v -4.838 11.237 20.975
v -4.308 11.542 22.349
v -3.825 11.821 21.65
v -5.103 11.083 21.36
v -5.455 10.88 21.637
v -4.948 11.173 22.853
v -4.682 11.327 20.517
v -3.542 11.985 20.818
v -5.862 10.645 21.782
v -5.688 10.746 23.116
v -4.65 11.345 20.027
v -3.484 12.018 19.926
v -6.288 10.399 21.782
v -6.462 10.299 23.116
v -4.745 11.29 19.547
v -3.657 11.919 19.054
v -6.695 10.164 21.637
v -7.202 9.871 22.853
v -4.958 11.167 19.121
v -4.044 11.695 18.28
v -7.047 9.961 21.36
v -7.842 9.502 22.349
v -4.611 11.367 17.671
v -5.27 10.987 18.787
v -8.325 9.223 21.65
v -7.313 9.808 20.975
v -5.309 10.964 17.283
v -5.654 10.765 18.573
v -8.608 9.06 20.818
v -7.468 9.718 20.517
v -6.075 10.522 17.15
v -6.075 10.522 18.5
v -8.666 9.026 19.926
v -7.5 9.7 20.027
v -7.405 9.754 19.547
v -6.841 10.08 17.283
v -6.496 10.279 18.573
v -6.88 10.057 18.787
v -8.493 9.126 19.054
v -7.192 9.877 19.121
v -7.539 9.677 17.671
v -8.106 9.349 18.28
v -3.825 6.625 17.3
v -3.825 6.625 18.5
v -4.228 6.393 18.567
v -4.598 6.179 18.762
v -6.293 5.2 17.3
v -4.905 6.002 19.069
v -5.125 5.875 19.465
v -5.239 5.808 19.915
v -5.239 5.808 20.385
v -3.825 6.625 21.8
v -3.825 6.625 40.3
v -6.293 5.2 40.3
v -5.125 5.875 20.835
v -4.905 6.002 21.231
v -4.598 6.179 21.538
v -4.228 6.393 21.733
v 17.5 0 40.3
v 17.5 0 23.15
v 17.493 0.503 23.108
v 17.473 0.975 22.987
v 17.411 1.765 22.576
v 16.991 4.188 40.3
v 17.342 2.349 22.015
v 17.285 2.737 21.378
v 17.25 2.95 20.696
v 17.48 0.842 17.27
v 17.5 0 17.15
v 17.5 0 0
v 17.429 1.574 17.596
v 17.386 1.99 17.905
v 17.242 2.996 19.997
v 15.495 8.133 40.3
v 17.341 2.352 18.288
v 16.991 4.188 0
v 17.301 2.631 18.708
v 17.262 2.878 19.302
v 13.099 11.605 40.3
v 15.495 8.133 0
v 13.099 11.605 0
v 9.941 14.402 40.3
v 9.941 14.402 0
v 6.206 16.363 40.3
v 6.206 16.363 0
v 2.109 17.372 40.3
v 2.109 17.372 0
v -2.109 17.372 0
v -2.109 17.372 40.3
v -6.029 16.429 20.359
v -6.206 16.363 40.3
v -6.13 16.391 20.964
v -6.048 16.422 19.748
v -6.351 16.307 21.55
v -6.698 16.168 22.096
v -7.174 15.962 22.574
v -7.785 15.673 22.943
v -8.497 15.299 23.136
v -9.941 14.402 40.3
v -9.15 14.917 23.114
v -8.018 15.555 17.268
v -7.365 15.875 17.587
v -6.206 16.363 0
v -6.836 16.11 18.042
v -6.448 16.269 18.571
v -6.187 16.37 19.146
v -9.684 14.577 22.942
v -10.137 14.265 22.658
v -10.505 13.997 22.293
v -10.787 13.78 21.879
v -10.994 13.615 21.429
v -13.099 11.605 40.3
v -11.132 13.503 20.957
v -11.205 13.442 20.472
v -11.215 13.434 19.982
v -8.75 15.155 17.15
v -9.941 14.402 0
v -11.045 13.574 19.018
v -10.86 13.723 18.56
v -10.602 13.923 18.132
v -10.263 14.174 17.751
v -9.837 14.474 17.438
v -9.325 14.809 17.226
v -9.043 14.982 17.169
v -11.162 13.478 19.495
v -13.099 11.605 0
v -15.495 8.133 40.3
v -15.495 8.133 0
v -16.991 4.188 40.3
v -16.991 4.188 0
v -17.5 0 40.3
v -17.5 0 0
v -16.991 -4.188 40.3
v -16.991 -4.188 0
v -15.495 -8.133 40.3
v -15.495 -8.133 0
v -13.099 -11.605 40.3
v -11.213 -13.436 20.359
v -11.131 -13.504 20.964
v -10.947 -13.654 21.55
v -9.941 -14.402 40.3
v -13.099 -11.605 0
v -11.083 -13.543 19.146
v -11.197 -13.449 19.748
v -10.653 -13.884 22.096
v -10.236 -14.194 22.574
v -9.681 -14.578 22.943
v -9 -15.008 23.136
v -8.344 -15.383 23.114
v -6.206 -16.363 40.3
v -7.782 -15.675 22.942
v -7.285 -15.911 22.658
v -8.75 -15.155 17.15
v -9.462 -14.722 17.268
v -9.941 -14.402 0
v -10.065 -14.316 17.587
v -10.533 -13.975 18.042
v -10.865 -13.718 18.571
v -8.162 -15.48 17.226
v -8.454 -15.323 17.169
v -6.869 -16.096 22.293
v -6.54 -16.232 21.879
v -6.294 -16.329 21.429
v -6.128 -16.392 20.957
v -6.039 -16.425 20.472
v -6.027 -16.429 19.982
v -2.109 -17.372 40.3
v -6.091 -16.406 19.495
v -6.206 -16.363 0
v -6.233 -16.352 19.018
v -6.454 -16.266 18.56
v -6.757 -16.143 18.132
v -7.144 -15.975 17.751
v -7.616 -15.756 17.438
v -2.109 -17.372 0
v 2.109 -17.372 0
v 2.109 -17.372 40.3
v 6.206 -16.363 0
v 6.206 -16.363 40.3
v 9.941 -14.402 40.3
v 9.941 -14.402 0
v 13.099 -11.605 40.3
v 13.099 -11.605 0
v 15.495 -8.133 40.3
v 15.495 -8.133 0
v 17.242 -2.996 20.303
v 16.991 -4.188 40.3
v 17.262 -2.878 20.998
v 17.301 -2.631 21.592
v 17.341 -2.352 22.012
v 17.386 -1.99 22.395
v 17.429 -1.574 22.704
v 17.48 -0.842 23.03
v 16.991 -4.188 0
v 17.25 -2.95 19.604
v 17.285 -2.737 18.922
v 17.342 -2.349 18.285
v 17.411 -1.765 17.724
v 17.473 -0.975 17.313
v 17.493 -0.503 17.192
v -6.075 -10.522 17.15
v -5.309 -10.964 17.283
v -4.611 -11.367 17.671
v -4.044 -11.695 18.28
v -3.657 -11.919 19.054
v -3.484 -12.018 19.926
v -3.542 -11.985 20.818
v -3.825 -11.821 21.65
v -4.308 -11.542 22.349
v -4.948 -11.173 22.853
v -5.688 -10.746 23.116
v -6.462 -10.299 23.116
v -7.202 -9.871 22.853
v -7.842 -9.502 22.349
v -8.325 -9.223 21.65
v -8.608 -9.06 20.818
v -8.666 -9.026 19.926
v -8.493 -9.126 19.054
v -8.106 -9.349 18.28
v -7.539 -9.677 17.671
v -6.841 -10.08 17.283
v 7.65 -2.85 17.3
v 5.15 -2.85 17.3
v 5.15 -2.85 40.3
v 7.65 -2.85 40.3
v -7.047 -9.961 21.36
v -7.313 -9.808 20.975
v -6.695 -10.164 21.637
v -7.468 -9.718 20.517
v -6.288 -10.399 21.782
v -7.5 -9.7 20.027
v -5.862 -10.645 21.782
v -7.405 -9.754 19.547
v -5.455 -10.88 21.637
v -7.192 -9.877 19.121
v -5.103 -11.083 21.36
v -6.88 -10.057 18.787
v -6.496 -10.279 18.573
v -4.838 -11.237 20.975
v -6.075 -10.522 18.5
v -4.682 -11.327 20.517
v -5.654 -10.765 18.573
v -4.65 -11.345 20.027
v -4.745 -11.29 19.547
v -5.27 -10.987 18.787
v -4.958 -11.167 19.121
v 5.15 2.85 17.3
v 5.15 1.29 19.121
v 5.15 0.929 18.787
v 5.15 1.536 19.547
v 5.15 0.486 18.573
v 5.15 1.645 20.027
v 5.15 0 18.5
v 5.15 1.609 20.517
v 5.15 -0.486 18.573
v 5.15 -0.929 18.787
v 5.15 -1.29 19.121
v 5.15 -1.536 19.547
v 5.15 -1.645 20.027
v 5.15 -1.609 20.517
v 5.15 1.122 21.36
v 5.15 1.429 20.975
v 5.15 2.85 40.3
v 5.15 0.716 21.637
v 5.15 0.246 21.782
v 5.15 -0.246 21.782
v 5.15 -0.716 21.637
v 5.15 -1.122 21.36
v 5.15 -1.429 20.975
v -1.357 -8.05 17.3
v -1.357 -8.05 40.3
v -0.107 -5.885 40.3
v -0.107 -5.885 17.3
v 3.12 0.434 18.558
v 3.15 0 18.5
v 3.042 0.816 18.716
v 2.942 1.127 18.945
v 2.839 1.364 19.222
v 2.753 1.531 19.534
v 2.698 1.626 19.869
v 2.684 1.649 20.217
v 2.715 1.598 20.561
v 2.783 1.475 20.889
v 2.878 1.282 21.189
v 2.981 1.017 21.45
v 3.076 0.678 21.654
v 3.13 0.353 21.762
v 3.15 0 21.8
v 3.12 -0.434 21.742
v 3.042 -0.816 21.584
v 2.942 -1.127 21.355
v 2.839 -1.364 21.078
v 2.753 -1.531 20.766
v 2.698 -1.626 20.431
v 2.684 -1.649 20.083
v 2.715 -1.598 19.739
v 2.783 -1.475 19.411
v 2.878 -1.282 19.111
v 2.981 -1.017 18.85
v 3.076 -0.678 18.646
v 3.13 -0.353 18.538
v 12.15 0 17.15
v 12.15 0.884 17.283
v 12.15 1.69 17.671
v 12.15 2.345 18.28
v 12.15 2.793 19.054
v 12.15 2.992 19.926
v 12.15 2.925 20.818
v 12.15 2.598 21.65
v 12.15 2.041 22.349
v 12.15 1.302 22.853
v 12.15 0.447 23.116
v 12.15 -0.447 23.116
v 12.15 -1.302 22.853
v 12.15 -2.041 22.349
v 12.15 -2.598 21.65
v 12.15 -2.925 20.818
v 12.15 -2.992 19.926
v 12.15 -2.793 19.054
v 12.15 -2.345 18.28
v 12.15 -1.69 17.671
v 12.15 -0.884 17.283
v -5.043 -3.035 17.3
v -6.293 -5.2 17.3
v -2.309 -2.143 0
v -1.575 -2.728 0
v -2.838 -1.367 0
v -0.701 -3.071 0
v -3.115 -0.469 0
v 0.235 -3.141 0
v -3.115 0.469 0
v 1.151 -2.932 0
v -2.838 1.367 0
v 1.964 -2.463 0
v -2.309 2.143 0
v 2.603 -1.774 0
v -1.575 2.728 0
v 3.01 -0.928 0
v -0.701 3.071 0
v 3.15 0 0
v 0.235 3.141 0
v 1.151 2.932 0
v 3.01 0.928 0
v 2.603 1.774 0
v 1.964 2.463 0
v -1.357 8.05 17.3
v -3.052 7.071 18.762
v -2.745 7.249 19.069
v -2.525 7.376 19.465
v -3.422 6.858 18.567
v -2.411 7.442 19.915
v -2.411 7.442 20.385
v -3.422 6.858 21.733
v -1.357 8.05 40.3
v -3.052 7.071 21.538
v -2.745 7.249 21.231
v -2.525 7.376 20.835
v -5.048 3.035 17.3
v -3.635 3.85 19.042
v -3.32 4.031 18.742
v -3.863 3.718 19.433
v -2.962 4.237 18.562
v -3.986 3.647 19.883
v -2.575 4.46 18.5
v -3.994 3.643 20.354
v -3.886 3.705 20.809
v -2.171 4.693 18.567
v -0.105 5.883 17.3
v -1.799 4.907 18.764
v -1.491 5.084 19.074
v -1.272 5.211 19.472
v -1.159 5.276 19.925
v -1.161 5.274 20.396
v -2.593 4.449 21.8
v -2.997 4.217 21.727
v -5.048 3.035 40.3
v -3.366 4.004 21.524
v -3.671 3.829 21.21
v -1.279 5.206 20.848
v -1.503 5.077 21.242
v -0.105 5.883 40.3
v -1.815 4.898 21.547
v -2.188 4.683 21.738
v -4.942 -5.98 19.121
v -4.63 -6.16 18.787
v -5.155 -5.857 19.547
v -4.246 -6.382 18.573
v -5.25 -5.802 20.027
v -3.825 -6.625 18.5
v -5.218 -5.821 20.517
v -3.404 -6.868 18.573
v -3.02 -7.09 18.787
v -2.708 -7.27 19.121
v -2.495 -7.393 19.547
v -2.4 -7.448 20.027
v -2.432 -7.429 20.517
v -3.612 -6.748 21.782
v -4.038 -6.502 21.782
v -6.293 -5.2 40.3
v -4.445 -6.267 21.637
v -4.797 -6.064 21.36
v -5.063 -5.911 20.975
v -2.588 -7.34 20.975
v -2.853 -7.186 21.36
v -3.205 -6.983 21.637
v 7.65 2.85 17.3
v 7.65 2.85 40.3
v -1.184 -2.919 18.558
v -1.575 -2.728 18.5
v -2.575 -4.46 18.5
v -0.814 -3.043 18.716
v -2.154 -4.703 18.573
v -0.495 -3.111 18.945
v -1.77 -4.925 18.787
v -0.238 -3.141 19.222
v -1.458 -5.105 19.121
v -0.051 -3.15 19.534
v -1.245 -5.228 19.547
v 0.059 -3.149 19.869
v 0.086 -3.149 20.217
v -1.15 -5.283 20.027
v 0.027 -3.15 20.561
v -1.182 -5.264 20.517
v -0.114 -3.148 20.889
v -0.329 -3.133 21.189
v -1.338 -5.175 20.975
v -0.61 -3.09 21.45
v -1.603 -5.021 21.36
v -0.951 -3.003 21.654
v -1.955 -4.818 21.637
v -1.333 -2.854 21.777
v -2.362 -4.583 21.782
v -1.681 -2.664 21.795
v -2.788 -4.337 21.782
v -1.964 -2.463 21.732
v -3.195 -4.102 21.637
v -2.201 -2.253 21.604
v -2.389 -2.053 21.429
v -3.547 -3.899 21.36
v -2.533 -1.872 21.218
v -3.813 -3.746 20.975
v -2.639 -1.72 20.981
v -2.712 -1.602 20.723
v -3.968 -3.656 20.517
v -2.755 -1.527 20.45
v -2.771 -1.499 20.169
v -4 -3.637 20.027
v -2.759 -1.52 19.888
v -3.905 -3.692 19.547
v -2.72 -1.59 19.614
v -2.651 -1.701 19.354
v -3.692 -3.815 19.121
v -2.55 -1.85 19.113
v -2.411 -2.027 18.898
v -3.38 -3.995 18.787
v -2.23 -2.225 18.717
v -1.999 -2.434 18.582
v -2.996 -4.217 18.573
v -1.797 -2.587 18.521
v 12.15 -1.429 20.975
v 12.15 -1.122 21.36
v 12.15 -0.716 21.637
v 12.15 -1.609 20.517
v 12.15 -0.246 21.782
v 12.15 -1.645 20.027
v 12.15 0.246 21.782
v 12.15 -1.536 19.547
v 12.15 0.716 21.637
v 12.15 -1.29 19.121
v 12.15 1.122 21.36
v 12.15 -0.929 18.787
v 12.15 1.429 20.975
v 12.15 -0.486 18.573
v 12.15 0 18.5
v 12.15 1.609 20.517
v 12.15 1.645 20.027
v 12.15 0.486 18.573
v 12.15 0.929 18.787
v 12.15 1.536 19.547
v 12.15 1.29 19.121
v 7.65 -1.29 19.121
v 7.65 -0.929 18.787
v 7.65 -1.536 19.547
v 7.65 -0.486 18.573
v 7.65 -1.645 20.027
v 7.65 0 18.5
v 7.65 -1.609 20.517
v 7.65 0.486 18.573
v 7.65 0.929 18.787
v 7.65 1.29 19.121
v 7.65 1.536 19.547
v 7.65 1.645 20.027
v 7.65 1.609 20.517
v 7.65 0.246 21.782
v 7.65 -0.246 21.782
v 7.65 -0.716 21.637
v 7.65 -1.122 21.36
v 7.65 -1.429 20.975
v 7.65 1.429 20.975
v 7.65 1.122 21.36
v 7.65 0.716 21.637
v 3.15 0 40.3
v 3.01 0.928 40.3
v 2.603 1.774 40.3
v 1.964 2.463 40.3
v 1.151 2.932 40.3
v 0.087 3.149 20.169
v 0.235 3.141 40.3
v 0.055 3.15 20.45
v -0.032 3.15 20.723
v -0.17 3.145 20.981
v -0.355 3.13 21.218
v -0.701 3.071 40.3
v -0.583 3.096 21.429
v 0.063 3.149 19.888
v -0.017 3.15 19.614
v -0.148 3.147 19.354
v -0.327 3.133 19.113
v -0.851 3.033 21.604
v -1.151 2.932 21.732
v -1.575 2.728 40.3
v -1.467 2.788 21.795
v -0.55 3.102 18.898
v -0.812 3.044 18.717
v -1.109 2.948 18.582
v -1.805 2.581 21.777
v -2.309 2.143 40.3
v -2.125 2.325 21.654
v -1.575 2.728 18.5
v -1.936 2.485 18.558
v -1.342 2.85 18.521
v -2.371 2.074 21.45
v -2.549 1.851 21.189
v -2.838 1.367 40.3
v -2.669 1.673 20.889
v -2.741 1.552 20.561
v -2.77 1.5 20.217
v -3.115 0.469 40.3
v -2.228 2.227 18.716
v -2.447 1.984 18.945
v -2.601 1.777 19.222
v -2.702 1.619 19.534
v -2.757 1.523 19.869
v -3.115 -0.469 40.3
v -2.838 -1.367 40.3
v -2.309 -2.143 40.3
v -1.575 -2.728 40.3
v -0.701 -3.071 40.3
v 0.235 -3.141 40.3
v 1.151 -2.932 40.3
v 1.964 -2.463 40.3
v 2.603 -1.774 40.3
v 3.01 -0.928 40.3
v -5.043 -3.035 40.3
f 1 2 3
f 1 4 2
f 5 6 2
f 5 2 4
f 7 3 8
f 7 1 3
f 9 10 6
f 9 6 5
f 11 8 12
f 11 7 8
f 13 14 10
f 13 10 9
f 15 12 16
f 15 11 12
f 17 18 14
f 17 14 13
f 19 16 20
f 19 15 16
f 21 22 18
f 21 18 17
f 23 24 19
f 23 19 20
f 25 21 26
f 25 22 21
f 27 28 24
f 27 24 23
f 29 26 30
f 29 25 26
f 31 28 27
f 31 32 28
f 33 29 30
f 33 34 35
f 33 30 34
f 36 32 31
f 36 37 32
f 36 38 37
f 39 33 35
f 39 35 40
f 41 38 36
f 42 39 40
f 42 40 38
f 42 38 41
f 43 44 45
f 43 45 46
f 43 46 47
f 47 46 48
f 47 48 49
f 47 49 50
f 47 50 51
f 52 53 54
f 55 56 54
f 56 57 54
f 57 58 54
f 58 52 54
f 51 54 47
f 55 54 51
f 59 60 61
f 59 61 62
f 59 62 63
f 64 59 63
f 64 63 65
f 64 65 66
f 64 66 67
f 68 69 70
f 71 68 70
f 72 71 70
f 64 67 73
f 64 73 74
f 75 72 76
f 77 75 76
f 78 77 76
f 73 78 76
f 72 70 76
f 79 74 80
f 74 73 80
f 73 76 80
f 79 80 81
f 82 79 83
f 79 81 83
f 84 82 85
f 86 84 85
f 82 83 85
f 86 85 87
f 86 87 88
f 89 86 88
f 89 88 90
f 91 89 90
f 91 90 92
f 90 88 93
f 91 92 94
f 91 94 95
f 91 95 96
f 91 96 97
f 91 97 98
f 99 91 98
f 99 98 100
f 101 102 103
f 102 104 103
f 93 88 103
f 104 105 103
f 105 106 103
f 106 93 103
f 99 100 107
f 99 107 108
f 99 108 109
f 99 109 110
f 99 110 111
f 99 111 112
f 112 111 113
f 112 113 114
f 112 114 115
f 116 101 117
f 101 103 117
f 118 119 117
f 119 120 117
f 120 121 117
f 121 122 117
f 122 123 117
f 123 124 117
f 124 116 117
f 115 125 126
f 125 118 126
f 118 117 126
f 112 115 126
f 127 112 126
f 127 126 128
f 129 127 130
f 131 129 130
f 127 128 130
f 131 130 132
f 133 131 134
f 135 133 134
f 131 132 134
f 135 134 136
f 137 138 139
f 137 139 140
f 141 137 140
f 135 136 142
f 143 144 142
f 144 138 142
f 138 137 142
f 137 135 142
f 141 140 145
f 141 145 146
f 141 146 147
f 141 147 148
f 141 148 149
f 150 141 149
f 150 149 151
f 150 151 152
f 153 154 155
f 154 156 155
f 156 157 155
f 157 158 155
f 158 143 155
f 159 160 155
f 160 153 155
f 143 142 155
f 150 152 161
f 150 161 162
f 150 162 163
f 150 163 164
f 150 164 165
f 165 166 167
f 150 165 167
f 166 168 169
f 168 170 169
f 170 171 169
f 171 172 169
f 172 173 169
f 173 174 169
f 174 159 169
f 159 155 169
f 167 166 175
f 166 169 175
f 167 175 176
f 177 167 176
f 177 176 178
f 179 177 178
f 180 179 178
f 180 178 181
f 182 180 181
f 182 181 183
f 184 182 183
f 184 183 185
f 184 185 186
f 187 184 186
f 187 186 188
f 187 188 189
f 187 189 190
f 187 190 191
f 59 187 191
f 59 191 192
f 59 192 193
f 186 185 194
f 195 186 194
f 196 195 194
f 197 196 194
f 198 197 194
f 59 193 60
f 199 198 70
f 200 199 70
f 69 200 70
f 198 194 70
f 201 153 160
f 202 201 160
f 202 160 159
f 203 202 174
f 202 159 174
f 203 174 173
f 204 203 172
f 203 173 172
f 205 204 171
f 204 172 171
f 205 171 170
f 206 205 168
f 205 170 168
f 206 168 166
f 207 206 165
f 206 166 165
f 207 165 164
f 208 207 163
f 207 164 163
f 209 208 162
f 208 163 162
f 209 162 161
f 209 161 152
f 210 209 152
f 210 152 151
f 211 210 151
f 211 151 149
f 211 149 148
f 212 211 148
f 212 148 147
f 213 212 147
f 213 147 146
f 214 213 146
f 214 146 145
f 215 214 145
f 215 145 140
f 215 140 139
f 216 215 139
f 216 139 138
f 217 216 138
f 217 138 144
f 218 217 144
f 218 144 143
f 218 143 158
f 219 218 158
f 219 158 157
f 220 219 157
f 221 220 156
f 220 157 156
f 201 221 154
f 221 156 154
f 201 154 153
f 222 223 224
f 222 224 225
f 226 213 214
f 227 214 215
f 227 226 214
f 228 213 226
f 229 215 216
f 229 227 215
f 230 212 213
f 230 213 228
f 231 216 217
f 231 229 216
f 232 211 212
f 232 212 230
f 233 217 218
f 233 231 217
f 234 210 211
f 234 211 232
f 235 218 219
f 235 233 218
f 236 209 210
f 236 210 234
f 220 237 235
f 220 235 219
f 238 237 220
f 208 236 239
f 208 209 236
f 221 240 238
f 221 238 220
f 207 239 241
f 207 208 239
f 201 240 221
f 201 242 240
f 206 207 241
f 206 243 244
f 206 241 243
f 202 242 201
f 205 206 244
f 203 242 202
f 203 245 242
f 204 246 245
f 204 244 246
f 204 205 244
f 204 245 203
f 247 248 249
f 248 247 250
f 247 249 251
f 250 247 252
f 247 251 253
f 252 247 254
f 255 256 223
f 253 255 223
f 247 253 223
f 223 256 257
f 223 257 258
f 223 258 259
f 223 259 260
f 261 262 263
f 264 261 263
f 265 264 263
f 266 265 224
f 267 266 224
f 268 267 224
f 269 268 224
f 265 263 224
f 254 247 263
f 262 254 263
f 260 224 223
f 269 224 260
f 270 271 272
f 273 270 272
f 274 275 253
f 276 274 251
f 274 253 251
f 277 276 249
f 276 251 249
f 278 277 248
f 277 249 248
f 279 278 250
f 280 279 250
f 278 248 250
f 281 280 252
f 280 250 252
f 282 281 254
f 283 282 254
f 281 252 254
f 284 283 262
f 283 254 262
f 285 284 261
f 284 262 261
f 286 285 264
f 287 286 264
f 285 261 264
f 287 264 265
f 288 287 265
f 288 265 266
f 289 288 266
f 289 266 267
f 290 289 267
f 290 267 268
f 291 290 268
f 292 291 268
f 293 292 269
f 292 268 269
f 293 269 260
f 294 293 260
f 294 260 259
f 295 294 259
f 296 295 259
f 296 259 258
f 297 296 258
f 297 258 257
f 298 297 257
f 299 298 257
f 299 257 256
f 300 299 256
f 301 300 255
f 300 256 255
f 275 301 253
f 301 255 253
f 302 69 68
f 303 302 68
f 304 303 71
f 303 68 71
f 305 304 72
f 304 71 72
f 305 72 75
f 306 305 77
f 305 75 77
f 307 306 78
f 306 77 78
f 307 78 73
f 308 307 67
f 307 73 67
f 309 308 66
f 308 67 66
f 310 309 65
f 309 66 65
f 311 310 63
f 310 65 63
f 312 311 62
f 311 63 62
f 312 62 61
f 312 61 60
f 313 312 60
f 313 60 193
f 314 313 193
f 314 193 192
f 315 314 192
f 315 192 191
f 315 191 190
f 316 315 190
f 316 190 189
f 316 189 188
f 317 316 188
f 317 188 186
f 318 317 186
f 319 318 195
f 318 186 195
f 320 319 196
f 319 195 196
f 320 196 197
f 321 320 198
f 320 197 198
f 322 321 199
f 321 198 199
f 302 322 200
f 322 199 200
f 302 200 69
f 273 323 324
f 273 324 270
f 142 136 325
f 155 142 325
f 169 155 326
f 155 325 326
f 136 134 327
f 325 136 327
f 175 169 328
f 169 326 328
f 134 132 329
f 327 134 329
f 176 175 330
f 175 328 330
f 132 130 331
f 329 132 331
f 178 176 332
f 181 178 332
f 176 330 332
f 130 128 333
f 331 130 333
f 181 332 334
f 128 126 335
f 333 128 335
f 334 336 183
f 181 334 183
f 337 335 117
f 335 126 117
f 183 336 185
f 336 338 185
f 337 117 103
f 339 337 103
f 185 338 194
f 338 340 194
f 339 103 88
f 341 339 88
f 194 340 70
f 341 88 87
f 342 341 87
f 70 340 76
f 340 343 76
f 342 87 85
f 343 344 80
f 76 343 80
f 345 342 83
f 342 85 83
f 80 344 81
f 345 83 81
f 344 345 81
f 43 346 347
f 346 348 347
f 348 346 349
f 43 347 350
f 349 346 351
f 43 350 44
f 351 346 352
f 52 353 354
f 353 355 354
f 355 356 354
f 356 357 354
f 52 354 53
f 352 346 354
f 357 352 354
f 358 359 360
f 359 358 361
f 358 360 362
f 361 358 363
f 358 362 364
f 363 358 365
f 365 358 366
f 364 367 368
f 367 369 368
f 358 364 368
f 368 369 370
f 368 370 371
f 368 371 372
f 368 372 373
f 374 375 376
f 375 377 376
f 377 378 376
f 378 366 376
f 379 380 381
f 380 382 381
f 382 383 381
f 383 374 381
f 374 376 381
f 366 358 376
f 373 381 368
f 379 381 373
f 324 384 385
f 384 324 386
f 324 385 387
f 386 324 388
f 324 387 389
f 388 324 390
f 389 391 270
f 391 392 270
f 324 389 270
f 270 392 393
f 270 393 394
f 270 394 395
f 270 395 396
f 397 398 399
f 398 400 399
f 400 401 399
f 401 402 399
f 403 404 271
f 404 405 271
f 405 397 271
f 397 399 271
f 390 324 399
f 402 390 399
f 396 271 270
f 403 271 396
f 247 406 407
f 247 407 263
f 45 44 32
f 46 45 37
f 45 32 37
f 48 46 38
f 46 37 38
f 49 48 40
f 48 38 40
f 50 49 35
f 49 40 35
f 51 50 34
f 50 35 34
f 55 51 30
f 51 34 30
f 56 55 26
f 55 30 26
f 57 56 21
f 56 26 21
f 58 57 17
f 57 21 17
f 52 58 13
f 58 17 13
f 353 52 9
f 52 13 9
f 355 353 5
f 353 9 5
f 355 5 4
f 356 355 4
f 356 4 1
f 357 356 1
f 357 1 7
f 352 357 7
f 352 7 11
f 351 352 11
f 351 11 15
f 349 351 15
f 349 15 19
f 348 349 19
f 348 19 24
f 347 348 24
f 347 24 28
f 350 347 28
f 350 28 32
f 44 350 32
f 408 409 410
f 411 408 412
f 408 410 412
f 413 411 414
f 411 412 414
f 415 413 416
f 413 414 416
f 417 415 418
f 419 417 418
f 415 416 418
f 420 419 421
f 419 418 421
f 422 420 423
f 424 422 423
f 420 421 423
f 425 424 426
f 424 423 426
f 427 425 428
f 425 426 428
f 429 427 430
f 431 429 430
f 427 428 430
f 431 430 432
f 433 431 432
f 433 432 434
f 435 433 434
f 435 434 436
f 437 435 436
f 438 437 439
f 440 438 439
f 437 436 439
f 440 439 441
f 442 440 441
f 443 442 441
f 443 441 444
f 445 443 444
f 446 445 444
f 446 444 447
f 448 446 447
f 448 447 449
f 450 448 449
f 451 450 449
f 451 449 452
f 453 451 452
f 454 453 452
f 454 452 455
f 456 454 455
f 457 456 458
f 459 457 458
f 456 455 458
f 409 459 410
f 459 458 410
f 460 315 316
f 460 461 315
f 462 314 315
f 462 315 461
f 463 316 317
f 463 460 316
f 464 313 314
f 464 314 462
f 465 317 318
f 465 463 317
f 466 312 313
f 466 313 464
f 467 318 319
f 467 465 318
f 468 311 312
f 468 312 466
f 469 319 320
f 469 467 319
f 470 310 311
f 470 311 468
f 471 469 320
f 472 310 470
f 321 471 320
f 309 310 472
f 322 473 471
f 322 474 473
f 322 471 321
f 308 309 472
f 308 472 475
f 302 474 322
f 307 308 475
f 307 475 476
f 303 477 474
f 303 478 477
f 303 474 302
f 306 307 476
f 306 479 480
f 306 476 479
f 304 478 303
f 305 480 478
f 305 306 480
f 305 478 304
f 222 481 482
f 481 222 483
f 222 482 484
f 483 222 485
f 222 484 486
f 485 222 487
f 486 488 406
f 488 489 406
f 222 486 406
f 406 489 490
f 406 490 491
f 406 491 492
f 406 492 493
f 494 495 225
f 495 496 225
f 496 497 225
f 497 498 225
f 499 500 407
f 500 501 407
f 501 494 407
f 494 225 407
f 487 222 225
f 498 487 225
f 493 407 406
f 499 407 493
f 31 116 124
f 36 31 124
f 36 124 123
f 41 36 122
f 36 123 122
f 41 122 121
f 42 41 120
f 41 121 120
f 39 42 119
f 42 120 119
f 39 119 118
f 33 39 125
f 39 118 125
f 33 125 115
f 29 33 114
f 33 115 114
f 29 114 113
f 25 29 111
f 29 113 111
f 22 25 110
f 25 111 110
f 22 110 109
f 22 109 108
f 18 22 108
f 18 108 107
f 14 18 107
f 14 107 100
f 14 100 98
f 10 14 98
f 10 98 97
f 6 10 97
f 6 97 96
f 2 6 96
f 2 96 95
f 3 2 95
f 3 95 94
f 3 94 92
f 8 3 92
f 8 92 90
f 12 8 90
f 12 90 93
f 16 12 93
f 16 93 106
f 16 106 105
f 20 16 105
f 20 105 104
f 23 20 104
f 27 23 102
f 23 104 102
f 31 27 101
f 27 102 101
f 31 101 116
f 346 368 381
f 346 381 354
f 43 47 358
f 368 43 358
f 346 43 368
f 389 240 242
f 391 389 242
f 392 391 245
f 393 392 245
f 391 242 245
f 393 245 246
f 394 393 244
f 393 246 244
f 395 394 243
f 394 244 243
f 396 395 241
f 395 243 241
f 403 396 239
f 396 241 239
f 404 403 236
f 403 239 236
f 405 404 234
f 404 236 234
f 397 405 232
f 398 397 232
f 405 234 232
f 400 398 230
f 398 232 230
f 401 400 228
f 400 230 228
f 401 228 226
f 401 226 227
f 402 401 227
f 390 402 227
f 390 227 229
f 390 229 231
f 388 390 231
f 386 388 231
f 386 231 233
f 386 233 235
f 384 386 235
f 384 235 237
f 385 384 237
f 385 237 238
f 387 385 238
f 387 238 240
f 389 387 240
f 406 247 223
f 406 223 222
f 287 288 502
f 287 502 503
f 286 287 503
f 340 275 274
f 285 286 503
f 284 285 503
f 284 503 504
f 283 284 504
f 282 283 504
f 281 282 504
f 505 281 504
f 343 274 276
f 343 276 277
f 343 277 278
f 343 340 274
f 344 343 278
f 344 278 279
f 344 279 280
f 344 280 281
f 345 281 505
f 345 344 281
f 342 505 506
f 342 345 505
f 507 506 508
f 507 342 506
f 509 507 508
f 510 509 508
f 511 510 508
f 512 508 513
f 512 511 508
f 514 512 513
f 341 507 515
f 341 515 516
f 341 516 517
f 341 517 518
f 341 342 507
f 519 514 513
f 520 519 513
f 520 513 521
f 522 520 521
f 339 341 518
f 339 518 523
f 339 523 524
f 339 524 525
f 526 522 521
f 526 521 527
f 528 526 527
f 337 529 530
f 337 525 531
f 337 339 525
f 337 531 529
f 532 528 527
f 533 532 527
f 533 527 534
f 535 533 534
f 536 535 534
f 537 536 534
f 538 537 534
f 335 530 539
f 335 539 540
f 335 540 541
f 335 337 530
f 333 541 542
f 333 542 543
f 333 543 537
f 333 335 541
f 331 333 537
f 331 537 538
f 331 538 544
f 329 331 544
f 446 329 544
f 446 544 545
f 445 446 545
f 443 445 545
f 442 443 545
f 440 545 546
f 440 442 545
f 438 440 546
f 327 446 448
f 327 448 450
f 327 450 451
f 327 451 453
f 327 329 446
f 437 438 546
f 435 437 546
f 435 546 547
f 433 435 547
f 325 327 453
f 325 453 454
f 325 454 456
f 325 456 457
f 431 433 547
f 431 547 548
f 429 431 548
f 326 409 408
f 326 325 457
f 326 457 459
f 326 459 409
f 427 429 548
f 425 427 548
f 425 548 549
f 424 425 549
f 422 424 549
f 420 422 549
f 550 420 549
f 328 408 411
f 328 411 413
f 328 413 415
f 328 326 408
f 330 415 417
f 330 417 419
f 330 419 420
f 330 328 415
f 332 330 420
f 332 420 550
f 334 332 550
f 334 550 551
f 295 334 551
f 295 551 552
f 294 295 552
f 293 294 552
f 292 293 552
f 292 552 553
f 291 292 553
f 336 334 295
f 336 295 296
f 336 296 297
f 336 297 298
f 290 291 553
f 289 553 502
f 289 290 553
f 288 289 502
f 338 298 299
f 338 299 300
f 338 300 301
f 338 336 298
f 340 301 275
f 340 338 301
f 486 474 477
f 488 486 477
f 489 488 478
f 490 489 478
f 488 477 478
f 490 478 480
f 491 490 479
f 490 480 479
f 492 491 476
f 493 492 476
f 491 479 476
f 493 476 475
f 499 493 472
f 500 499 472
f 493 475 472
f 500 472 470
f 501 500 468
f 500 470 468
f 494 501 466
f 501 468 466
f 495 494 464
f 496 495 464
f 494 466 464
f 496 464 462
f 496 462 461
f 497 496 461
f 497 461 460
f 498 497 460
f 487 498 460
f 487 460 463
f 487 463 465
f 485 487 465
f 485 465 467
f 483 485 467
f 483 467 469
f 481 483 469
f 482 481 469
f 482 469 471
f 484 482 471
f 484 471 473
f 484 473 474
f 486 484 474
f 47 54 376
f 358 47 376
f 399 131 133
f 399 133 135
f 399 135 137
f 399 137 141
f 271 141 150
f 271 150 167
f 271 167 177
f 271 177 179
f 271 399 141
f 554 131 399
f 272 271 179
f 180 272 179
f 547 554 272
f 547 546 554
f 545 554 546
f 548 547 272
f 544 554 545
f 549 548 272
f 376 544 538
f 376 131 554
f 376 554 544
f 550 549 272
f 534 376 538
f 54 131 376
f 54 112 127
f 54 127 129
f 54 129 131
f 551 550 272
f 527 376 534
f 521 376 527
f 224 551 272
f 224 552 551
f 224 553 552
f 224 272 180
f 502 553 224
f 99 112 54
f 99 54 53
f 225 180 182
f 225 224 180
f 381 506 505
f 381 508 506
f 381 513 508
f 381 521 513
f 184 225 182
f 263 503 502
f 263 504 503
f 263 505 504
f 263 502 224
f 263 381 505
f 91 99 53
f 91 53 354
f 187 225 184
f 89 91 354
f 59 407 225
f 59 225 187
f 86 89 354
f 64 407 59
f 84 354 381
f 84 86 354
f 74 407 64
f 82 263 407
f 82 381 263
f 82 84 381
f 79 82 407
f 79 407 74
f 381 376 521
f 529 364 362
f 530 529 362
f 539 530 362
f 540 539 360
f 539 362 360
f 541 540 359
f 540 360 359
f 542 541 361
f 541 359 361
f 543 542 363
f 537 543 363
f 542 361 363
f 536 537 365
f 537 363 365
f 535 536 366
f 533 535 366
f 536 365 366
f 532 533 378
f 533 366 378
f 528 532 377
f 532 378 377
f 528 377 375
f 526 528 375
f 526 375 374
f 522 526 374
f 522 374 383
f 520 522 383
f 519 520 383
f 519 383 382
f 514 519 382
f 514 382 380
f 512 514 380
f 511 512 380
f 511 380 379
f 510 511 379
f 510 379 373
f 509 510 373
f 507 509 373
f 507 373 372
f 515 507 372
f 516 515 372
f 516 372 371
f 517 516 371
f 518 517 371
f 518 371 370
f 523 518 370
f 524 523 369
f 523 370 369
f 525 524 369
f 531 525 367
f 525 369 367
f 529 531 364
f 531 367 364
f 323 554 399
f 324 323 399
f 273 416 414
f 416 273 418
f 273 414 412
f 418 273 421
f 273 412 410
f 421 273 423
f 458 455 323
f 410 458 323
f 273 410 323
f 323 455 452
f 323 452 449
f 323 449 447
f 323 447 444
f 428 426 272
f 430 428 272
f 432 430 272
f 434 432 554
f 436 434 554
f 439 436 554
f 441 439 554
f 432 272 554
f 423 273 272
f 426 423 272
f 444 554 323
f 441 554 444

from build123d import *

# Parameters (mm, degrees)
SKETCH1_R           = 17.5
SKETCH1_R_2         = 3.15
BOSS_EXTRUDE1_DEPTH = 40.3
CUT_EXTRUDE1_DEPTH  = 23
CUT_EXTRUDE4_REACH  = 43.405
SKETCH8_R           = 1.65
CUT_EXTRUDE5_REACH  = 43.405
SKETCH10_R          = 1.65
SKETCH12_R          = 3
CUT_EXTRUDE6_DEPTH  = 5.35
SKETCH15_R          = 3
CUT_EXTRUDE8_DEPTH  = 5.35
CUT_EXTRUDE9_REACH  = 43.405
SKETCH17_R          = 1.65
CUT_EXTRUDE10_REACH = 43.405
SKETCH18_R          = 1.65
SKETCH19_R          = 3
CUT_EXTRUDE11_DEPTH = 5.35
CUT_EXTRUDE12_REACH = 37
SKETCH20_R          = 1.65
CUT_EXTRUDE13_REACH = 37
SKETCH21_R          = 1.65


with BuildPart() as part:
    # Sketch1 → Boss-Extrude1 (new body)
    with BuildSketch(Plane.XY):
        Circle(SKETCH1_R)
        Circle(SKETCH1_R_2, mode=Mode.SUBTRACT)
    extrude(amount=BOSS_EXTRUDE1_DEPTH)

    # Sketch2 → Cut-Extrude1 (cut)
    with BuildSketch(Plane.XY.offset(40.3)):
        Polygon((7.65, 0), (7.65, 2.85), (5.15, 2.85), (5.15, -2.85), (7.65, -2.85), align=None)
        Polygon((-3.825, -6.625094339), (-1.356827599, -8.050094339), (-0.106827599, -5.885030829), (-5.043172401, -3.035030829), (-6.293172401, -5.200094339), align=None)
        Polygon((-3.825, 6.625094339), (-6.293172401, 5.200094339), (-5.048242412, 3.035349353), (-0.105426694, 5.882604512), (-1.356827546, 8.050094369), align=None)
    extrude(amount=-CUT_EXTRUDE1_DEPTH, mode=Mode.SUBTRACT)

    # Sketch8 → Cut-Extrude4 (cut, up to next)
    with BuildSketch(Plane(origin=(-8.75, -15.155444566, 0), x_dir=(0, 0, -1), z_dir=(-0.5, -0.866025404, 0)), mode=Mode.PRIVATE) as cut_extrude4_sk1:
        with Locations((-20.15, 0)):
            Circle(SKETCH8_R)
    cut_extrude4_tool1 = extrude(cut_extrude4_sk1.sketch, amount=-CUT_EXTRUDE4_REACH, mode=Mode.PRIVATE) & part.part
    add(cut_extrude4_tool1.solids().sort_by_distance((-8.75, -15.155445, 20.15))[0], mode=Mode.SUBTRACT)

    # Sketch10 → Cut-Extrude5 (cut, up to next)
    with BuildSketch(Plane(origin=(-8.75, -15.155444566, 0), x_dir=(0, 0, -1), z_dir=(-0.5, -0.866025404, 0)), mode=Mode.PRIVATE) as cut_extrude5_sk1:
        with Locations((-20.15, 0)):
            Circle(SKETCH10_R)
    cut_extrude5_tool1 = extrude(cut_extrude5_sk1.sketch, amount=-CUT_EXTRUDE5_REACH, mode=Mode.PRIVATE) & part.part
    add(cut_extrude5_tool1.solids().sort_by_distance((-8.75, -15.155445, 20.15))[0], mode=Mode.SUBTRACT)

    # Sketch12 → Cut-Extrude6 (cut)
    with BuildSketch(Plane(origin=(-8.75, -15.155444566, 0), x_dir=(0, 0, -1), z_dir=(-0.5, -0.866025404, 0))):
        with Locations((-20.15, 0)):
            Circle(SKETCH12_R)
    extrude(amount=-CUT_EXTRUDE6_DEPTH, mode=Mode.SUBTRACT)

    # Sketch15 → Cut-Extrude8 (cut)
    with BuildSketch(Plane(origin=(-8.75, 15.155444566, 0), x_dir=(0, 0, -1), z_dir=(-0.5, 0.866025404, 0))):
        with Locations((-20.15, 0)):
            Circle(SKETCH15_R)
    extrude(amount=-CUT_EXTRUDE8_DEPTH, mode=Mode.SUBTRACT)

    # Sketch17 → Cut-Extrude9 (cut, up to next)
    with BuildSketch(Plane(origin=(-8.75, 15.155444566, 0), x_dir=(0, 0, -1), z_dir=(-0.5, 0.866025404, 0)), mode=Mode.PRIVATE) as cut_extrude9_sk1:
        with Locations((-20.15, 0)):
            Circle(SKETCH17_R)
    cut_extrude9_tool1 = extrude(cut_extrude9_sk1.sketch, amount=-CUT_EXTRUDE9_REACH, mode=Mode.PRIVATE) & part.part
    add(cut_extrude9_tool1.solids().sort_by_distance((-8.75, 15.155445, 20.15))[0], mode=Mode.SUBTRACT)

    # Sketch18 → Cut-Extrude10 (cut, up to next)
    with BuildSketch(Plane(origin=(-8.75, 15.155444566, 0), x_dir=(0, 0, -1), z_dir=(-0.5, 0.866025404, 0)), mode=Mode.PRIVATE) as cut_extrude10_sk1:
        with Locations((-20.15, 0)):
            Circle(SKETCH18_R)
    cut_extrude10_tool1 = extrude(cut_extrude10_sk1.sketch, amount=-CUT_EXTRUDE10_REACH, mode=Mode.PRIVATE) & part.part
    add(cut_extrude10_tool1.solids().sort_by_distance((-8.75, 15.155445, 20.15))[0], mode=Mode.SUBTRACT)

    # Sketch19 → Cut-Extrude11 (cut)
    with BuildSketch(Plane(origin=(17.5, 0, 0), x_dir=(0, 0, -1), z_dir=(1, 0, 0))):
        with Locations((-20.15, 0)):
            Circle(SKETCH19_R)
    extrude(amount=-CUT_EXTRUDE11_DEPTH, mode=Mode.SUBTRACT)

    # Sketch20 → Cut-Extrude12 (cut, up to next)
    with BuildSketch(Plane(origin=(17.5, 0, 0), x_dir=(0, 0, -1), z_dir=(1, 0, 0)), mode=Mode.PRIVATE) as cut_extrude12_sk1:
        with Locations((-20.15, 0)):
            Circle(SKETCH20_R)
    cut_extrude12_tool1 = extrude(cut_extrude12_sk1.sketch, amount=-CUT_EXTRUDE12_REACH, mode=Mode.PRIVATE) & part.part
    add(cut_extrude12_tool1.solids().sort_by_distance((17.5, 0, 20.15))[0], mode=Mode.SUBTRACT)

    # Sketch21 → Cut-Extrude13 (cut, up to next)
    with BuildSketch(Plane(origin=(17.5, 0, 0), x_dir=(0, 0, -1), z_dir=(1, 0, 0)), mode=Mode.PRIVATE) as cut_extrude13_sk1:
        with Locations((-20.15, 0)):
            Circle(SKETCH21_R)
    cut_extrude13_tool1 = extrude(cut_extrude13_sk1.sketch, amount=-CUT_EXTRUDE13_REACH, mode=Mode.PRIVATE) & part.part
    add(cut_extrude13_tool1.solids().sort_by_distance((17.5, 0, 20.15))[0], mode=Mode.SUBTRACT)


solid = part.part
